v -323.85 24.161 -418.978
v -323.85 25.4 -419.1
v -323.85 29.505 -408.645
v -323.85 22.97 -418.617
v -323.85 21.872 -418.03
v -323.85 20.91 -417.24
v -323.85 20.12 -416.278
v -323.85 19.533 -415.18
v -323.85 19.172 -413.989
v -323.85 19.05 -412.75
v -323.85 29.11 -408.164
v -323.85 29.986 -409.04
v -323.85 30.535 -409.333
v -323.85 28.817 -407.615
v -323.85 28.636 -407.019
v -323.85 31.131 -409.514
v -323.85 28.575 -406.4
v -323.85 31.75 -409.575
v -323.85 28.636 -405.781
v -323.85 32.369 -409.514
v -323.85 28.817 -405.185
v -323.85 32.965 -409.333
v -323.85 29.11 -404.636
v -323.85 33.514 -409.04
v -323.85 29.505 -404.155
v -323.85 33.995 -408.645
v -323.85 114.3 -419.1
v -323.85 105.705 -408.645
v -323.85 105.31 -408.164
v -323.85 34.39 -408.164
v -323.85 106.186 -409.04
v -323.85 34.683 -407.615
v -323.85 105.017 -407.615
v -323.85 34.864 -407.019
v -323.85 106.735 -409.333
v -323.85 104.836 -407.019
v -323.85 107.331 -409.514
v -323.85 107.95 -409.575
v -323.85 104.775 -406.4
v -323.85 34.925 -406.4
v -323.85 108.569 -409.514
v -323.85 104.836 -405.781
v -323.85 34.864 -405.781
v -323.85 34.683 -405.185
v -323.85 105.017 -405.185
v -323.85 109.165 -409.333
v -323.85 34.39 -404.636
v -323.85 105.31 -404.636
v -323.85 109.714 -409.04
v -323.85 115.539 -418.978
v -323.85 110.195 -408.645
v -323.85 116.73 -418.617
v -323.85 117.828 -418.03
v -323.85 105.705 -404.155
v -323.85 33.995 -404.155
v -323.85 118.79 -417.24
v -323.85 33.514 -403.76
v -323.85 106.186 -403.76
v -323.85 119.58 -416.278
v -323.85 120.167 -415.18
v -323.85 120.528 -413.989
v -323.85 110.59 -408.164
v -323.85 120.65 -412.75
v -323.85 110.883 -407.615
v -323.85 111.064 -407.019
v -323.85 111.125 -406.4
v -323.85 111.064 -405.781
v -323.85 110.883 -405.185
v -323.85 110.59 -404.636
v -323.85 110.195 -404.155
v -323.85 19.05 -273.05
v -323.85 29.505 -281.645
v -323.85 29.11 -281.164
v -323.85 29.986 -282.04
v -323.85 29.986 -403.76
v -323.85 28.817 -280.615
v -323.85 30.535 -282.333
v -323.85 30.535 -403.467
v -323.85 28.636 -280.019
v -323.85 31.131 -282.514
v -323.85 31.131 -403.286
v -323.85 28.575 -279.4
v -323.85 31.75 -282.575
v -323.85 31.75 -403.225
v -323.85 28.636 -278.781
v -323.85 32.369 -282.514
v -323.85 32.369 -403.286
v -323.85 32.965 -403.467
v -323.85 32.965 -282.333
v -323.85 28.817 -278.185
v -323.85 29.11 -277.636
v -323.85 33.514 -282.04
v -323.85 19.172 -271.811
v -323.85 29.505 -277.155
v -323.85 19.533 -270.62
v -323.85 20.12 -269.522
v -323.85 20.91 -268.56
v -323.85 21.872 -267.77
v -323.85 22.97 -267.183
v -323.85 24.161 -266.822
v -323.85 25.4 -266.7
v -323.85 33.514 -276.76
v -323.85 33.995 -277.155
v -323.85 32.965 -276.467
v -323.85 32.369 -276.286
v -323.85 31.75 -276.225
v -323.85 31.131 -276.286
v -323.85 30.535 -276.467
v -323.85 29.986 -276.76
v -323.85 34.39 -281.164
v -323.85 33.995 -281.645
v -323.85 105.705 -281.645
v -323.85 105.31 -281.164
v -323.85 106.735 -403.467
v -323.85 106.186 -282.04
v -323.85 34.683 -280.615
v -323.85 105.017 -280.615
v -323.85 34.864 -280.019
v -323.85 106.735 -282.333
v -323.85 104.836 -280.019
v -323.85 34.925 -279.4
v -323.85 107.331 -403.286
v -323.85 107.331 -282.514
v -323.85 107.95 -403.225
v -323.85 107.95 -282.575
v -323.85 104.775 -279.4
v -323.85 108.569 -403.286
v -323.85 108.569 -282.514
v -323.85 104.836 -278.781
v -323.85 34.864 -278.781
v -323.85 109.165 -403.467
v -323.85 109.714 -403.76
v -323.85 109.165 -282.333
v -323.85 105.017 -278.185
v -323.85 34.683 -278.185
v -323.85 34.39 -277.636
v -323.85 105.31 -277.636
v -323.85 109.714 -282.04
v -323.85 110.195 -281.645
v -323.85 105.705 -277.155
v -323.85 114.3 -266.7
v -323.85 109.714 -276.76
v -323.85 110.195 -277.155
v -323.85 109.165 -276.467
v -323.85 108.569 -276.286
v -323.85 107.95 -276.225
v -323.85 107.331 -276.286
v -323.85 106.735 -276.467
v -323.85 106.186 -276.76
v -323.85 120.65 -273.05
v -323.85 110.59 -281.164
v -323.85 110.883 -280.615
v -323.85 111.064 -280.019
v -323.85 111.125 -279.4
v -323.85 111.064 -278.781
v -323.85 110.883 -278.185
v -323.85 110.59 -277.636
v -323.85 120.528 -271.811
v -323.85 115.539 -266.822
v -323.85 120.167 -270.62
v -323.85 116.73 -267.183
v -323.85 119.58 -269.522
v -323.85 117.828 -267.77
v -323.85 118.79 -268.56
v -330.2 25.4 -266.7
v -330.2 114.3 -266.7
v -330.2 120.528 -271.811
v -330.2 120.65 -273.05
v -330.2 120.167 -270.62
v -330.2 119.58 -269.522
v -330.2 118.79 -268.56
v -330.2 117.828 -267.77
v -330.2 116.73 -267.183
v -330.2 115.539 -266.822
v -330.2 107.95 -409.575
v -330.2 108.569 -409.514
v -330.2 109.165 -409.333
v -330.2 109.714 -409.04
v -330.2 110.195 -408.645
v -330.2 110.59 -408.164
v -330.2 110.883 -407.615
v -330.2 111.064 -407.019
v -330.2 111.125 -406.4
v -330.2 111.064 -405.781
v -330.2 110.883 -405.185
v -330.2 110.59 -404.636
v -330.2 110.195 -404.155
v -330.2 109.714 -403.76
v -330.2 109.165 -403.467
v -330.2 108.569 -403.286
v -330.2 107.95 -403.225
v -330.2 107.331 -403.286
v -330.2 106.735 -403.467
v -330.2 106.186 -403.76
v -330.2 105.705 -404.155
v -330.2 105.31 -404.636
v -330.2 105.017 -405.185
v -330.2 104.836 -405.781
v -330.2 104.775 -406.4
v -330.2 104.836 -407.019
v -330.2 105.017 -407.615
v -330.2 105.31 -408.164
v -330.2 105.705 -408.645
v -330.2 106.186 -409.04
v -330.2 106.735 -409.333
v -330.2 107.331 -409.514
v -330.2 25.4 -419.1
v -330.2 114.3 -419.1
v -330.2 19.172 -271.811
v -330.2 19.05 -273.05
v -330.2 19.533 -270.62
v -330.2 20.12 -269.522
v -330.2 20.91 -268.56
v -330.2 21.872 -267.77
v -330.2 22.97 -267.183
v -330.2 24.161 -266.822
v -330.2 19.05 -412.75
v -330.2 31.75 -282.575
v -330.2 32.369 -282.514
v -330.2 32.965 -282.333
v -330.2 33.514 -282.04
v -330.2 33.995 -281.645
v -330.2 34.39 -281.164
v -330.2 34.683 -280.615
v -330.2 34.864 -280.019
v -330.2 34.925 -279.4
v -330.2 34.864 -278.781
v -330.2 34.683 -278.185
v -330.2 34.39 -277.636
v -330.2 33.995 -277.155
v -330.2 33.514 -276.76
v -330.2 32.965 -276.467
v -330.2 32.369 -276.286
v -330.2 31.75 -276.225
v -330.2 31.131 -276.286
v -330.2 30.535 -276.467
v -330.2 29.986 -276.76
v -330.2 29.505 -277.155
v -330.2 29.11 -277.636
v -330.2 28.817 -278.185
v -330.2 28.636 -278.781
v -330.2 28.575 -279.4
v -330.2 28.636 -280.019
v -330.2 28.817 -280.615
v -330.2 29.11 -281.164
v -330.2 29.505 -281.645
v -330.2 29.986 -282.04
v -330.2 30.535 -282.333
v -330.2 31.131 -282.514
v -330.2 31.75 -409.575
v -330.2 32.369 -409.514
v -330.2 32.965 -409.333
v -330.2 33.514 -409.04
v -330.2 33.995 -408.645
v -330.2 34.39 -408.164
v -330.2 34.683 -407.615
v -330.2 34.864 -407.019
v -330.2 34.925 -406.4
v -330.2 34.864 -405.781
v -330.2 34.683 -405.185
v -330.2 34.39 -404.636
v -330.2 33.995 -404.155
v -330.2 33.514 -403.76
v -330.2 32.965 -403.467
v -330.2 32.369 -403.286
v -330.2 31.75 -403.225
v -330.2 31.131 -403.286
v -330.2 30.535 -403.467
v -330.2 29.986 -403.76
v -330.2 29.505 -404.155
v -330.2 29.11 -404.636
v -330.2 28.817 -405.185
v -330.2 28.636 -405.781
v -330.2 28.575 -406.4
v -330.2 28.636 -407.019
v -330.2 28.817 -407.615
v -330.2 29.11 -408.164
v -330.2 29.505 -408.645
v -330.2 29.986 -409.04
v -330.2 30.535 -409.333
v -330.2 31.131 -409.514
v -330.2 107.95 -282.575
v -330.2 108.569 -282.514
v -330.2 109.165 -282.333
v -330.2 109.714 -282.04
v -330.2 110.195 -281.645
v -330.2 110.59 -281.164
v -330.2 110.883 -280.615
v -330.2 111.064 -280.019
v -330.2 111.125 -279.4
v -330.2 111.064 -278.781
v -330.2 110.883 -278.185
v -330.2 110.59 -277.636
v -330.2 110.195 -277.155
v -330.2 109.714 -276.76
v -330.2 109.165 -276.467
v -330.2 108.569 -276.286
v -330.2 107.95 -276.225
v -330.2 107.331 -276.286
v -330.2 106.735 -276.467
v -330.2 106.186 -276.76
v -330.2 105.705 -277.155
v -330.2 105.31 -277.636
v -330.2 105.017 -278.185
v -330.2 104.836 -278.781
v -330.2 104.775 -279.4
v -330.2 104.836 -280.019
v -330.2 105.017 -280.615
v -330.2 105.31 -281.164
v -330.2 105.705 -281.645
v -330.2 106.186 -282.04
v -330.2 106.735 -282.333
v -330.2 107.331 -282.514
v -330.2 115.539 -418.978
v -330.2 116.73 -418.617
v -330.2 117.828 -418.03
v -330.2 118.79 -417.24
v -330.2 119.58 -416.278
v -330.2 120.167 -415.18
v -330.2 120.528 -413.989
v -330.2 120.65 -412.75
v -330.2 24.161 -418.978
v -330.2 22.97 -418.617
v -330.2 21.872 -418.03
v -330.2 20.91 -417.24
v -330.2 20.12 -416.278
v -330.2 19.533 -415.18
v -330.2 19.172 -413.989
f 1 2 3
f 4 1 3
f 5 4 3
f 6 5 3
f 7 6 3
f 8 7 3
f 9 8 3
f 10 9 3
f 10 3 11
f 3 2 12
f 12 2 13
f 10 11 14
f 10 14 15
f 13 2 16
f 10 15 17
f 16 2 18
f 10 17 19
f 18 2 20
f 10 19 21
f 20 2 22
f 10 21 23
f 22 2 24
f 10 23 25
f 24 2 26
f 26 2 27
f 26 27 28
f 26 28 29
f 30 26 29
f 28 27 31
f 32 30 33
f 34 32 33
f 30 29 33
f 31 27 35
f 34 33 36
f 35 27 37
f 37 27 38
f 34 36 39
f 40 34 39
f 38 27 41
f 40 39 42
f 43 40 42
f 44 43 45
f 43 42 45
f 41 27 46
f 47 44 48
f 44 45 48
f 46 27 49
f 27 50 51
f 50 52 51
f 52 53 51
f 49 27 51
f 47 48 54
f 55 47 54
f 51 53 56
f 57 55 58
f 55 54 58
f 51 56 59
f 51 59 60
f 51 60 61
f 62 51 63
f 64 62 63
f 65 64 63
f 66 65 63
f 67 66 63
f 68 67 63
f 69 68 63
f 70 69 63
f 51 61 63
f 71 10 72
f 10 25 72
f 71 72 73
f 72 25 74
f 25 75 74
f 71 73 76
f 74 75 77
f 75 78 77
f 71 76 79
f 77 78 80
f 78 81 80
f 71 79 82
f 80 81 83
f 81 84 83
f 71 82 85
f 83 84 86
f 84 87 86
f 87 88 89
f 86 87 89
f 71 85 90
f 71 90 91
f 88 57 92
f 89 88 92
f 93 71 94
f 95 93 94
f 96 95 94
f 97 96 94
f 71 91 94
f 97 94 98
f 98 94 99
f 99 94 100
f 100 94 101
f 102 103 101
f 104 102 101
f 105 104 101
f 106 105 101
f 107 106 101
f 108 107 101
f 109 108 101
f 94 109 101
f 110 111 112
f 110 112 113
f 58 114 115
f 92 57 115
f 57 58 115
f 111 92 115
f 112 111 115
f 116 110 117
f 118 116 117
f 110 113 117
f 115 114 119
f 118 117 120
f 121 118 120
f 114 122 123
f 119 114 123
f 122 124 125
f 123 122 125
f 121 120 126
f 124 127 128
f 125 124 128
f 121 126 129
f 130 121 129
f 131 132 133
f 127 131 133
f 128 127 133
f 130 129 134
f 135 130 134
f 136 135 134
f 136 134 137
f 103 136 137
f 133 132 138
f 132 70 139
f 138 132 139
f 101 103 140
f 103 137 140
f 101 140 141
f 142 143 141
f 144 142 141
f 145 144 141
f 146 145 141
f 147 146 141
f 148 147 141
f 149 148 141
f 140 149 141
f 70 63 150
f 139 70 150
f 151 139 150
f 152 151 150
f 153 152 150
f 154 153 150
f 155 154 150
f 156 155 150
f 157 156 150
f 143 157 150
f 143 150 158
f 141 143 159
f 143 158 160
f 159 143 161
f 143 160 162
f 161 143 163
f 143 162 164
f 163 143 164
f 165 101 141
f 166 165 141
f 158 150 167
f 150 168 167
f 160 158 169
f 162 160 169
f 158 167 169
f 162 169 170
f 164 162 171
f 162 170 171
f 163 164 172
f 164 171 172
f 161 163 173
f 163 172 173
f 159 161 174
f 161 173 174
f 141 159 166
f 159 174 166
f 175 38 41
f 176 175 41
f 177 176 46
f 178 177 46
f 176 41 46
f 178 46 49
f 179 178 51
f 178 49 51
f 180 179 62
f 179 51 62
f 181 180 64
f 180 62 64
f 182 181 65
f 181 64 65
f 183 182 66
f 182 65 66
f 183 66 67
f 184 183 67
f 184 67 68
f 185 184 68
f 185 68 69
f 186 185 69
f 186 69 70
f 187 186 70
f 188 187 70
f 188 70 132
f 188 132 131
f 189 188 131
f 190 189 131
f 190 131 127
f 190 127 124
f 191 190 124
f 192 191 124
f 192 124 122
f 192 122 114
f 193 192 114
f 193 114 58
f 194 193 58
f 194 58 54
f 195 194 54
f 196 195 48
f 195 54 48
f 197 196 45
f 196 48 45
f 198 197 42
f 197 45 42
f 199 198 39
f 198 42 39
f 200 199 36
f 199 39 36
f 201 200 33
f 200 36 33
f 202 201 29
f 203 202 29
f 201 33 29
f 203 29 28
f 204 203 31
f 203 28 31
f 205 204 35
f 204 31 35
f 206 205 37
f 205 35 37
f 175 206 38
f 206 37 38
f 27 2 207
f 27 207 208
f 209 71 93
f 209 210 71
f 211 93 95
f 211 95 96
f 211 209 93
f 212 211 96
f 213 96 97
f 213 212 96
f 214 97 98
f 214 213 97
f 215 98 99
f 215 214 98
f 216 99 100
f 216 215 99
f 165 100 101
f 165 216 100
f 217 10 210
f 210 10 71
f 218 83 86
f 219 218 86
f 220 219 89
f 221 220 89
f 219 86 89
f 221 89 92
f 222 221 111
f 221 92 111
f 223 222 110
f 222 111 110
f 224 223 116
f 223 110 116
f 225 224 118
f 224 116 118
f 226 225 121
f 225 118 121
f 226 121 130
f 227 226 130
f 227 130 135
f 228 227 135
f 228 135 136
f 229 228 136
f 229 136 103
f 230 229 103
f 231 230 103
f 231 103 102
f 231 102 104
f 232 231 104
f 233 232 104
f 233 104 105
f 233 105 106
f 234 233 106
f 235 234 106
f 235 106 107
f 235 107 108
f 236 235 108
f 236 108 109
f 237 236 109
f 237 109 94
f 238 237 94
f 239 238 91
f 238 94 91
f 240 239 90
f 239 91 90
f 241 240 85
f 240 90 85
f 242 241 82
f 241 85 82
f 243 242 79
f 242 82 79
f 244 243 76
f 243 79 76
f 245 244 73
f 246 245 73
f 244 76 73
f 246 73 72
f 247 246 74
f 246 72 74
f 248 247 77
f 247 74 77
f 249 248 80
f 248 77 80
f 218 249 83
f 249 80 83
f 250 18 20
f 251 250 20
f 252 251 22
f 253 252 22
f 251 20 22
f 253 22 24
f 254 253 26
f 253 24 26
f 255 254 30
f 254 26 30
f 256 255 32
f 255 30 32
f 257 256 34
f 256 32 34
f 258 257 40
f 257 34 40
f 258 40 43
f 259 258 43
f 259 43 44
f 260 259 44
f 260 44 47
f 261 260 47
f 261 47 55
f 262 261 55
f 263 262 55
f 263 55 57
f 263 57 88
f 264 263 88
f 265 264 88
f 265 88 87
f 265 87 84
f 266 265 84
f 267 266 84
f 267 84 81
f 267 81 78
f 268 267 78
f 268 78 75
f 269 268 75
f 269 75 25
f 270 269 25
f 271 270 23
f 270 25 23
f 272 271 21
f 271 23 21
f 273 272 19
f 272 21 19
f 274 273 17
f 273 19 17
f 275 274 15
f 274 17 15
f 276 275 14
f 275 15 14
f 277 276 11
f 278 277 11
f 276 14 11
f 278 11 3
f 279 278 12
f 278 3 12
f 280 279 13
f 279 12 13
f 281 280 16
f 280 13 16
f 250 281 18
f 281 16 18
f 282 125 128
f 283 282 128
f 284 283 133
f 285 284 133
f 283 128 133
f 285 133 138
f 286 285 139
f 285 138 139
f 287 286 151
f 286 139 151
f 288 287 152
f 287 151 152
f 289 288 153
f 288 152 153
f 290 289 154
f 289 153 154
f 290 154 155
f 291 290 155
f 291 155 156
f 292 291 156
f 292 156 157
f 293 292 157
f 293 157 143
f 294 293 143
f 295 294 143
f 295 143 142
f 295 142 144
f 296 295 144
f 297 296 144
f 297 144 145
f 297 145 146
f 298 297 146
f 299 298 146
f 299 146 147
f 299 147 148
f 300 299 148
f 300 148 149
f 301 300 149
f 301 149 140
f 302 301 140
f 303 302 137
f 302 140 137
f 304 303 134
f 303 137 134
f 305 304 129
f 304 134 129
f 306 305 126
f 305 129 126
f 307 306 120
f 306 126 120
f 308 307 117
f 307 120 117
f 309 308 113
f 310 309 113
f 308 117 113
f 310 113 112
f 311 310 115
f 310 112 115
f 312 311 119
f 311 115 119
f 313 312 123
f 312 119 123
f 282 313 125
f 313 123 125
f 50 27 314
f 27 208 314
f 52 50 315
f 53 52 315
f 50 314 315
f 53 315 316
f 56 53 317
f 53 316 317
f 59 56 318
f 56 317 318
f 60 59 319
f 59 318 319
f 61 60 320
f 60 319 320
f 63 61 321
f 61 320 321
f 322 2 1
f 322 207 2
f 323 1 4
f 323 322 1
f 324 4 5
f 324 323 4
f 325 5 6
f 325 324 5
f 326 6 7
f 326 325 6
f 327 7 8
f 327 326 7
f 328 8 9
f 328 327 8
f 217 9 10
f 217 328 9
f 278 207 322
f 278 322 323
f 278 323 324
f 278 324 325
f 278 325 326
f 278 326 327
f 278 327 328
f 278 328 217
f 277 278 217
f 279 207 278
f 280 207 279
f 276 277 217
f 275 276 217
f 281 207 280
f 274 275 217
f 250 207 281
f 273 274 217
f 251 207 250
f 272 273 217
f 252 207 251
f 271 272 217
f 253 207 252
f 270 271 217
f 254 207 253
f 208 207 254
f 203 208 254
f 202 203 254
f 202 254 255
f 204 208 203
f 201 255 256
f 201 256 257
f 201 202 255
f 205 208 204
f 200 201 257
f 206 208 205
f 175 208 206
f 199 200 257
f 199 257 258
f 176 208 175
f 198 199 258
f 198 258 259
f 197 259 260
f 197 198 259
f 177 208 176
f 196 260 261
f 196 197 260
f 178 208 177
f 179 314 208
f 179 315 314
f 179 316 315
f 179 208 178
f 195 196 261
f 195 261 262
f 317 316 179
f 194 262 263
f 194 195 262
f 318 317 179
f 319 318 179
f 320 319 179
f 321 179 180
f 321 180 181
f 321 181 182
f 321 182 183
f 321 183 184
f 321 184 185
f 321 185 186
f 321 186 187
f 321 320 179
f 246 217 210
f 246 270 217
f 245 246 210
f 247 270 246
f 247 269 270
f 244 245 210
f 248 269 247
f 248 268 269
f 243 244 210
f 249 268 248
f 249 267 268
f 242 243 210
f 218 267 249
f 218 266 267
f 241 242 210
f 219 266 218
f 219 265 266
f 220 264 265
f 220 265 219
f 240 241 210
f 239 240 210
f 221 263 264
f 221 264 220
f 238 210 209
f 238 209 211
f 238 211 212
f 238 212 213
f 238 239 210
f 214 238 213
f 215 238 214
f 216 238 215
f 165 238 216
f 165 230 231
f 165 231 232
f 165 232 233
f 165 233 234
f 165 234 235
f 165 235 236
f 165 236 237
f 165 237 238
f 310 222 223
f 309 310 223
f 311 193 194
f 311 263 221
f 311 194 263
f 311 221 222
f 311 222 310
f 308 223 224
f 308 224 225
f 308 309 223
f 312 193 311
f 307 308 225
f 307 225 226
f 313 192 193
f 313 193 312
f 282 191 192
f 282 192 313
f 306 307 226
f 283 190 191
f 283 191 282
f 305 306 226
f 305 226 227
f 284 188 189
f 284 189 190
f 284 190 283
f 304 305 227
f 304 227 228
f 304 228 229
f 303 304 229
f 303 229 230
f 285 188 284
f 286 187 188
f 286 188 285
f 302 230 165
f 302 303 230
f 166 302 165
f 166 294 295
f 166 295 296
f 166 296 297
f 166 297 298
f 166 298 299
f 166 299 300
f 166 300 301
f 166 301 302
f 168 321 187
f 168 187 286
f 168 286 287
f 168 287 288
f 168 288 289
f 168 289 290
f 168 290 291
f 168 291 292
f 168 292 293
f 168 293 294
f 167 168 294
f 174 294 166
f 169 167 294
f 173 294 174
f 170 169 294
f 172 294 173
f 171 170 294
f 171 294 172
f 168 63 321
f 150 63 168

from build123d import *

# Parameters (mm, degrees)
SKETCH1_W                   = 152.4
SKETCH1_H                   = 101.6
BOSS_EXTRUDE1_DEPTH         = 6.35
F_1_4_0_25_DIAMETER_HOLE1_D = 6.35
LPATTERN1_COUNT             = 2
LPATTERN1_PITCH             = 76.2
LPATTERN1_COUNT_DIR2        = 2
LPATTERN1_PITCH_DIR2        = 127
FILLET1_R                   = 6.35


with BuildPart() as part:
    # Sketch1 → Boss-Extrude1 (new body)
    with BuildSketch(Plane.ZY.offset(323.85)):
        with Locations((-342.9, 69.85)):
            Rectangle(SKETCH1_W, SKETCH1_H)
    extrude(amount=BOSS_EXTRUDE1_DEPTH)

    # 1/4 (0.25) Diameter Hole1 (through all)
    with Locations(Plane.ZY.offset(330.2)):
        with Locations((-406.4, 31.75)):
            f_1_4_0_25_diameter_hole1 = Hole(F_1_4_0_25_DIAMETER_HOLE1_D / 2)

    # LPattern1: 1_4 _0.25_ Diameter Hole1 2 × 2
    with Locations(*[(0, i * LPATTERN1_PITCH, j * LPATTERN1_PITCH_DIR2) for i in range(LPATTERN1_COUNT) for j in range(LPATTERN1_COUNT_DIR2) if (i, j) != (0, 0)]):
        add(f_1_4_0_25_diameter_hole1, mode=Mode.SUBTRACT)

    # Fillet1
    fillet1_edges = [part.edges().sort_by_distance(p)[0] for p in [
        (-327.025, 120.65, -419.1),
        (-327.025, 120.65, -266.7),
        (-327.025, 19.05, -266.7),
        (-327.025, 19.05, -419.1),
    ]]
    fillet(fillet1_edges, radius=FILLET1_R)


solid = part.part
